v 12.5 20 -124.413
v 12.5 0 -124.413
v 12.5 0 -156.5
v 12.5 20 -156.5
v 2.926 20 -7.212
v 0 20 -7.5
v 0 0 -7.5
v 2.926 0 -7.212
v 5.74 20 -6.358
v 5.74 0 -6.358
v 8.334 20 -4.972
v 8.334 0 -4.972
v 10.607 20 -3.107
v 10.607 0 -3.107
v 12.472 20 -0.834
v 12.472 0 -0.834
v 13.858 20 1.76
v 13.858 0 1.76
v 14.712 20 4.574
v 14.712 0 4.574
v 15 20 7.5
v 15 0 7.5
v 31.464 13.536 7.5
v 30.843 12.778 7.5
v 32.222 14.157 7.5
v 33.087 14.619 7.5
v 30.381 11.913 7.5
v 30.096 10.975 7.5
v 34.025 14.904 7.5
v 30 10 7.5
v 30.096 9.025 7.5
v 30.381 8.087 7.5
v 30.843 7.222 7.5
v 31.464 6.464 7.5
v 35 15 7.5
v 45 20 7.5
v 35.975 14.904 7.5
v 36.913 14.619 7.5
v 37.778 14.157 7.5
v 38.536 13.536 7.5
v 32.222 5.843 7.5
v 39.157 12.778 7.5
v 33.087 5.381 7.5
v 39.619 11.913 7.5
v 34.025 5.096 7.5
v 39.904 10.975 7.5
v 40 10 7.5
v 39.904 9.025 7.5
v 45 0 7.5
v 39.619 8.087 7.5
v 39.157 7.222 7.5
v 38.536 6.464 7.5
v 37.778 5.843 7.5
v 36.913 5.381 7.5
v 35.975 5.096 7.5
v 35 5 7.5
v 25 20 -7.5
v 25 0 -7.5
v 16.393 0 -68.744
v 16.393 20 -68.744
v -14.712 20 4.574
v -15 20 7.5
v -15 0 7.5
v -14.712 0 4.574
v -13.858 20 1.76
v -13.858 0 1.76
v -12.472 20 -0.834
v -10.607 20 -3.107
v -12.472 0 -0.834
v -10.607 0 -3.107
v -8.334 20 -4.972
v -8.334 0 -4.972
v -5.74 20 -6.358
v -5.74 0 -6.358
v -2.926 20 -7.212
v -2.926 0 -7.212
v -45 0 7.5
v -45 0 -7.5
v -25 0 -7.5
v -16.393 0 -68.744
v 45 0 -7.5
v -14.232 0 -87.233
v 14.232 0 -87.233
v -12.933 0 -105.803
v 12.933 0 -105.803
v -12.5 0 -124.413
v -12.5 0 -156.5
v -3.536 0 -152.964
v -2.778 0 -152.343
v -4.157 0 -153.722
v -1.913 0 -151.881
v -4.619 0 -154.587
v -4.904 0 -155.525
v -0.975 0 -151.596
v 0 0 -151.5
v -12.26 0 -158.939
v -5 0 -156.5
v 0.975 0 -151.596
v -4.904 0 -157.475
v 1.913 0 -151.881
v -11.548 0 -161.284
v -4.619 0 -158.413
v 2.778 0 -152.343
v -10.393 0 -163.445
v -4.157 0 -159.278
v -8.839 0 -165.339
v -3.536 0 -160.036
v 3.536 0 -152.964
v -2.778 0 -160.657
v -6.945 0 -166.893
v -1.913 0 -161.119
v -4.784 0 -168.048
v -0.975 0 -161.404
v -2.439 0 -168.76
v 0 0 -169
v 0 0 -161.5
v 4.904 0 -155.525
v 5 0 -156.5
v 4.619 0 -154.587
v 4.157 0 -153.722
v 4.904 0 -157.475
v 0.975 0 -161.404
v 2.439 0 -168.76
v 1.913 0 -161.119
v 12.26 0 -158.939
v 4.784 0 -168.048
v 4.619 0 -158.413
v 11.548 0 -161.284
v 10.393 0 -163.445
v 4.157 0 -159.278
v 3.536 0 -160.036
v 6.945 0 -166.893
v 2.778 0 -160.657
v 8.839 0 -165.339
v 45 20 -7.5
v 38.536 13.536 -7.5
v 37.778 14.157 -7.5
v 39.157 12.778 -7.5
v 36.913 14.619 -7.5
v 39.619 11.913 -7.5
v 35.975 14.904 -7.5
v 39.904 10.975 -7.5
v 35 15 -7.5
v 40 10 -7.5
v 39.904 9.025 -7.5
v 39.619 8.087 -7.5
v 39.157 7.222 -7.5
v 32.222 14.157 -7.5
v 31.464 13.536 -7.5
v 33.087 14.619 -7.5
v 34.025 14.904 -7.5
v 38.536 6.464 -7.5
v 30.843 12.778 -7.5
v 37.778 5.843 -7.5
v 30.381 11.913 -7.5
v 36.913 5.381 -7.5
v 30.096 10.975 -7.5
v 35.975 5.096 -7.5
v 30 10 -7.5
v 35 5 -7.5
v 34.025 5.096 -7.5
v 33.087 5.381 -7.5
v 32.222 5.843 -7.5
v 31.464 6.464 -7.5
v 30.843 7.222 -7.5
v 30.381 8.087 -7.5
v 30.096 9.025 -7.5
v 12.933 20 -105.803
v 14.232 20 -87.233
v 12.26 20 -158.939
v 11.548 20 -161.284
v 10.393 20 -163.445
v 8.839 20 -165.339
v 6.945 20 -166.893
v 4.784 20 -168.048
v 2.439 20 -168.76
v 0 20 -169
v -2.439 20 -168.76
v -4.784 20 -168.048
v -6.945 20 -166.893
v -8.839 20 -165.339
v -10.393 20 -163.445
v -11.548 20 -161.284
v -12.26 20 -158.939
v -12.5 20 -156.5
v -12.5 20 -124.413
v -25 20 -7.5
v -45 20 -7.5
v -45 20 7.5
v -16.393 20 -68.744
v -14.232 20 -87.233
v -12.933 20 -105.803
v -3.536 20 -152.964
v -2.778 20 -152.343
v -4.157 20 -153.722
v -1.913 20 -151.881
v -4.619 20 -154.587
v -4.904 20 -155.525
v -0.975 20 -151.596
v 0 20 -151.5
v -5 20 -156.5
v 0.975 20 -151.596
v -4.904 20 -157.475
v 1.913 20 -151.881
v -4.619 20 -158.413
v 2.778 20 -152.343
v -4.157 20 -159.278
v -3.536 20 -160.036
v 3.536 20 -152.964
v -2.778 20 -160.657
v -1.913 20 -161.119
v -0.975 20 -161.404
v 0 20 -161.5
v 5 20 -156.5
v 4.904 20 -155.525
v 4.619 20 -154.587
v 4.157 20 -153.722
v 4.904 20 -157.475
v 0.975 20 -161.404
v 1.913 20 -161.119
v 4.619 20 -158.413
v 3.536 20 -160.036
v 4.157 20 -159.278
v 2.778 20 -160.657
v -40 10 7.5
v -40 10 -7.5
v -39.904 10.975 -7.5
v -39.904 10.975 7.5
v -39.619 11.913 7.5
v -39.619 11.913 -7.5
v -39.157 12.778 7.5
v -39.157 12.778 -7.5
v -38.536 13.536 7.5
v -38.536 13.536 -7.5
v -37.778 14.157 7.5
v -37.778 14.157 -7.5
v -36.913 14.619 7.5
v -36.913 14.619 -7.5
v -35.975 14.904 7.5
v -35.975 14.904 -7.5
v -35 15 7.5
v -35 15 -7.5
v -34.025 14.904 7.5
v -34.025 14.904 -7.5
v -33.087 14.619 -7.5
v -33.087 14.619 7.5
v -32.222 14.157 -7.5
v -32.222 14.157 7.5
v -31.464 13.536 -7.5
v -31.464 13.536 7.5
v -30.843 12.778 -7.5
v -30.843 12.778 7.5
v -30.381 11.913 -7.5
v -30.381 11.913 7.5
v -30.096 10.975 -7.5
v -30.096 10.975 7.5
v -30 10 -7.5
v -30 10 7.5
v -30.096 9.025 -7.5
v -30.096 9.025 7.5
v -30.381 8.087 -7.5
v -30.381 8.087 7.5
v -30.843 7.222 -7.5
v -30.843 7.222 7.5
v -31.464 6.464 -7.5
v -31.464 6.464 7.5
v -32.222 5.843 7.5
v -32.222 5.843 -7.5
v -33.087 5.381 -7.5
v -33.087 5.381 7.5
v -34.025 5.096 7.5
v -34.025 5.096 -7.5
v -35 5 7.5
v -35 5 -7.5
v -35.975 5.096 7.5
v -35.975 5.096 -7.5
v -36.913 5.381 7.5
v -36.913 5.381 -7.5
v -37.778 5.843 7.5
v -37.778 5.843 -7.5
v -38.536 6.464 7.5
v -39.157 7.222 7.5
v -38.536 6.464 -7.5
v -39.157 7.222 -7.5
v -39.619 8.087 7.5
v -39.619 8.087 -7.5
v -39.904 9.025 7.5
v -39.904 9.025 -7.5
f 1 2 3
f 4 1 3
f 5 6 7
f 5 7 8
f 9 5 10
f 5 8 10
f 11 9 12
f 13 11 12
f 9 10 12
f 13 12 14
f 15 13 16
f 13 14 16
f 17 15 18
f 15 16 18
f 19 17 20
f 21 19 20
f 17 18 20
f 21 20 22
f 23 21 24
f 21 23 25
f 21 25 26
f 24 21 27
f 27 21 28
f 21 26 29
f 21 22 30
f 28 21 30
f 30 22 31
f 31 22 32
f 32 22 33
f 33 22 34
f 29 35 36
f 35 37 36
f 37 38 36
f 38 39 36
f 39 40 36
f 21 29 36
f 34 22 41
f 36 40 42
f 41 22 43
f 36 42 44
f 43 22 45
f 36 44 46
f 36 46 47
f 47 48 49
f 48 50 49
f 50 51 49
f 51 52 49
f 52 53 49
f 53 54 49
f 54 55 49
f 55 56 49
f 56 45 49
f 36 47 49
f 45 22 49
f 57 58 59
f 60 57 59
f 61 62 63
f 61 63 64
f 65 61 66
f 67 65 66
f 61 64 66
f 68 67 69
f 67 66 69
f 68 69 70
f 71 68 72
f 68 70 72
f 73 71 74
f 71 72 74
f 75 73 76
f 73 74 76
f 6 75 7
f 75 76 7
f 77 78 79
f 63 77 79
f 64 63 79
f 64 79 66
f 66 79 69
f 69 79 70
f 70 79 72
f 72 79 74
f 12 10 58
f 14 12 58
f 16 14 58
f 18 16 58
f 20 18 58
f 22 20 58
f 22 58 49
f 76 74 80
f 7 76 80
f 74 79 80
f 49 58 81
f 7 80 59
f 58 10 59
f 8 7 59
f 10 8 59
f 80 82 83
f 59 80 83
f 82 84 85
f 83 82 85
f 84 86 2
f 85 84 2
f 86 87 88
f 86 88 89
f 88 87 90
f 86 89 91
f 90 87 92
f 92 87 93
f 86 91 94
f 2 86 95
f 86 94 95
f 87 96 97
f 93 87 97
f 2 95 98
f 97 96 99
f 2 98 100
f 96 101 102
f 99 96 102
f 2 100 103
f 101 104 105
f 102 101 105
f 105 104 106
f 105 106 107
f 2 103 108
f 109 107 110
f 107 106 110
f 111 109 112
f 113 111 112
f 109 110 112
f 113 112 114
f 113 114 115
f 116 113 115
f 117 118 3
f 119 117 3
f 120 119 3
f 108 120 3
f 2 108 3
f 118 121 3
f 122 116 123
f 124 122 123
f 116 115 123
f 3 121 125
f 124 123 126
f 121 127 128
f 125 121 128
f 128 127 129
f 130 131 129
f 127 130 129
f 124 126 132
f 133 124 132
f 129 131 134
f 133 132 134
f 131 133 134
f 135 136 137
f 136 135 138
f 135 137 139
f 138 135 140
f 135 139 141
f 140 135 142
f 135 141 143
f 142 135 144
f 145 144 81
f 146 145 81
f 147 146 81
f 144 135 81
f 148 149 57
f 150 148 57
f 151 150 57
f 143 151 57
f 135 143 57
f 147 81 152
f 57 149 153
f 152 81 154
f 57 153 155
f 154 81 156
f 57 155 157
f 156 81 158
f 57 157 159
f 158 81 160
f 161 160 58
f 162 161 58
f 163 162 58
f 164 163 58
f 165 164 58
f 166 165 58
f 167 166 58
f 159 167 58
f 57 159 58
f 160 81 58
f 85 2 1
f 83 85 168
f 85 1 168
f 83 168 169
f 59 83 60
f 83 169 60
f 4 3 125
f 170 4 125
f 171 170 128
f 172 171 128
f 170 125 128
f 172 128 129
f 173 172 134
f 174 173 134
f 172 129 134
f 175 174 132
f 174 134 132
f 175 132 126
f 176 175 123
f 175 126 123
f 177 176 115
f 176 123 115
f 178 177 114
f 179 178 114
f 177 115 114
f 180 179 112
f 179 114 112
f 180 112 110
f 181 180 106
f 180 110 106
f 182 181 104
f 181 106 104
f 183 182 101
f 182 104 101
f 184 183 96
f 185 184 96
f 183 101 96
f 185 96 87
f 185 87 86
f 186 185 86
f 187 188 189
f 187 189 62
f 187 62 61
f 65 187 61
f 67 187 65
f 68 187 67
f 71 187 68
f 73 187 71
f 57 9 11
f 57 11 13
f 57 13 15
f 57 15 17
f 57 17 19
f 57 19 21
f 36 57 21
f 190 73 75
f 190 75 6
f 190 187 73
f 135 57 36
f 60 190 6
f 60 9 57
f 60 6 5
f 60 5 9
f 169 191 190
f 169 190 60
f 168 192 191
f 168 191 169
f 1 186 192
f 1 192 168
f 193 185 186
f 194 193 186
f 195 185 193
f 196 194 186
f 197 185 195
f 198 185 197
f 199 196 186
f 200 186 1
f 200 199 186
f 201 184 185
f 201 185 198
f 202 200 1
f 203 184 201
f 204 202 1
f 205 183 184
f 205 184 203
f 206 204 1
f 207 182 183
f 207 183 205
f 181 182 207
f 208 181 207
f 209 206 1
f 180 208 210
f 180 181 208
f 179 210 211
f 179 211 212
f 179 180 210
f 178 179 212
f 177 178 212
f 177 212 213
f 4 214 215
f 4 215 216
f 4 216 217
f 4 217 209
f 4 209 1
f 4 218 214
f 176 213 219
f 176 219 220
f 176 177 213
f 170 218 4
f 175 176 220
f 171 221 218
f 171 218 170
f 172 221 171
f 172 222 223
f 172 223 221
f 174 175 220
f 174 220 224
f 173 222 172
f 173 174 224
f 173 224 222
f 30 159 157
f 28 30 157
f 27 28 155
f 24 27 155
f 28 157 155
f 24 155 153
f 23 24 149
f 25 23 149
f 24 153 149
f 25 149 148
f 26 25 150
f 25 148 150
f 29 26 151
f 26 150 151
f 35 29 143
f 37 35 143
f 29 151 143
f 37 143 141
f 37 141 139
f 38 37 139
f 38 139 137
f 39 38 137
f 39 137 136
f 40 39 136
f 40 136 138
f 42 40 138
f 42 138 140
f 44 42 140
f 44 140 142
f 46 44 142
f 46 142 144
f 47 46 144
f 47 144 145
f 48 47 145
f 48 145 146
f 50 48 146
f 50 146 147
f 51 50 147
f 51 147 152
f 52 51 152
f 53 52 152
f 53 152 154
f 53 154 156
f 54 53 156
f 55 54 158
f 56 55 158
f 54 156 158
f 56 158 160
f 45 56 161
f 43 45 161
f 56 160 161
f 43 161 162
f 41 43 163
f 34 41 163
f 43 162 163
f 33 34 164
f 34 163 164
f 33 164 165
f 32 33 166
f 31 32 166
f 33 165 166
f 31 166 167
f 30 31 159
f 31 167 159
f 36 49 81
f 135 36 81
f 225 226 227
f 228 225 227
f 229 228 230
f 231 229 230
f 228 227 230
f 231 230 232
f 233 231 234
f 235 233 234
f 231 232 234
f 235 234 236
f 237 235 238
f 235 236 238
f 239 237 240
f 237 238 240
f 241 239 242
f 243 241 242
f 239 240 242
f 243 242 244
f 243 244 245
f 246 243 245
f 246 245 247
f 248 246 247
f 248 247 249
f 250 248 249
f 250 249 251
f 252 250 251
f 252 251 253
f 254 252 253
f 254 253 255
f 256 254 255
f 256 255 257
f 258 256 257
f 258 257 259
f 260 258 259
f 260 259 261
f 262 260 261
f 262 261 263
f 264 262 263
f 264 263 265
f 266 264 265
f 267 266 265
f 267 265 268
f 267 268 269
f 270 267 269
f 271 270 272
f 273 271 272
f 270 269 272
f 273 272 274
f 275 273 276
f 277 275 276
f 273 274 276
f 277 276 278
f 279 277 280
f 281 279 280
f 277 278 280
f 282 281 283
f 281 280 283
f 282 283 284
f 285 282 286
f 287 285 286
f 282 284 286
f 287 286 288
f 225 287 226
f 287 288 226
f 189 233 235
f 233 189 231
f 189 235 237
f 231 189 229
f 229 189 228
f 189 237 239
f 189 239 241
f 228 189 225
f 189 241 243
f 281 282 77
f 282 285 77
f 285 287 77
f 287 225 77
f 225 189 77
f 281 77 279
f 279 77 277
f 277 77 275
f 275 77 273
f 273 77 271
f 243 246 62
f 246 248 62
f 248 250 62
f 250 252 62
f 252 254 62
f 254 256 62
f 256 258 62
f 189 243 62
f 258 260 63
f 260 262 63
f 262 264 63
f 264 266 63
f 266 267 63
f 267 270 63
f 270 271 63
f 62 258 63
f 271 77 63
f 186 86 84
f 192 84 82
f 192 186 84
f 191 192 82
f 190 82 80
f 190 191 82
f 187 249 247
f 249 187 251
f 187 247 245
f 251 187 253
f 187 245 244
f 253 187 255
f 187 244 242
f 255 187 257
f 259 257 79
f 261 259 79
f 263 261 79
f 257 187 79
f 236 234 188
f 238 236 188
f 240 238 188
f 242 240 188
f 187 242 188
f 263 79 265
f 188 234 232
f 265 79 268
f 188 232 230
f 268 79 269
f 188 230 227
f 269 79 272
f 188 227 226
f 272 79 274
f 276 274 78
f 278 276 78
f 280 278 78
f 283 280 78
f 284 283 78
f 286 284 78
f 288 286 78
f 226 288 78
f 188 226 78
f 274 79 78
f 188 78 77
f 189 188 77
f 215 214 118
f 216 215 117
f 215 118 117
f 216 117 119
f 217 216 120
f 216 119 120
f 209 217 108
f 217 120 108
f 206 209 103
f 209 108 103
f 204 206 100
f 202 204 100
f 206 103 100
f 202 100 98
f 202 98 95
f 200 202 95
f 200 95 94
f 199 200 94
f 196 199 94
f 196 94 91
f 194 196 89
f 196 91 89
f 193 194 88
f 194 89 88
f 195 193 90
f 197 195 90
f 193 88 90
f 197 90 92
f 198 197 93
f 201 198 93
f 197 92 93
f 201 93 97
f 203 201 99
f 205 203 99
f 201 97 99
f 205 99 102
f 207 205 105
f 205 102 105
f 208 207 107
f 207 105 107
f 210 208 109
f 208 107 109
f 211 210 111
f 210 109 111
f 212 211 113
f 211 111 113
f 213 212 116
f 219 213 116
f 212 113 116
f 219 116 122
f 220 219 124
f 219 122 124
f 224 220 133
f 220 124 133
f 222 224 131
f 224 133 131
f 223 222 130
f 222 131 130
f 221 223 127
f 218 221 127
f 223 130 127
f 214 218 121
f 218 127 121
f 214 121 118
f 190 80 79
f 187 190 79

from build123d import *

# Parameters (mm, degrees)
BOSS_EXTRUDE1_DEPTH = 20
SKETCH2_R           = 5
CUT_EXTRUDE1_DEPTH  = 16
FILLET1_R           = 400


with BuildPart() as part:
    # Sketch1 → Boss-Extrude1 (new body)
    with BuildSketch(Plane(origin=(0, 0, 0), x_dir=(1, 0, 0), z_dir=(0, 1, 0))):
        with BuildLine():
            ThreePointArc((12.5, 156.5), (0, 169), (-12.5, 156.5))
            Line((-12.5, 156.5), (-5, 156.5))
            ThreePointArc((-5, 156.5), (0, 161.5), (5, 156.5))
            Line((5, 156.5), (12.5, 156.5))
        make_face()
        with BuildLine():
            Line((-5, 156.5), (-12.5, 156.5))
            ThreePointArc((-12.5, 156.5), (0, 144), (12.5, 156.5))
            Line((12.5, 156.5), (5, 156.5))
            ThreePointArc((5, 156.5), (0, 151.5), (-5, 156.5))
        make_face()
        with BuildLine():
            Line((-12.5, 156.5), (-12.5, 96.44212153))
            Line((-12.5, 96.44212153), (12.5, 96.44212153))
            Line((12.5, 96.44212153), (12.5, 156.5))
            ThreePointArc((12.5, 156.5), (0, 144), (-12.5, 156.5))
        make_face()
        Polygon((-12.5, 96.44212153), (-25, 7.5), (-2.3e-08, 7.5), (25, 7.5), (12.5, 96.44212153), align=None)
        with BuildLine():
            Line((-2.3e-08, 7.5), (-25, 7.5))
            Line((-25, 7.5), (-45, 7.5))
            Line((-45, 7.5), (-45, -7.5))
            Line((-45, -7.5), (-15, -7.5))
            ThreePointArc((-15, -7.5), (-10.606601726, 3.10660171), (-2.3e-08, 7.5))
        make_face()
        with BuildLine():
            Line((25, 7.5), (-2.3e-08, 7.5))
            ThreePointArc((-2.3e-08, 7.5), (10.60660171, 3.106601726), (15, -7.5))
            Line((15, -7.5), (45, -7.5))
            Line((45, -7.5), (45, 7.5))
            Line((45, 7.5), (25, 7.5))
        make_face()
    extrude(amount=BOSS_EXTRUDE1_DEPTH)

    # Sketch2 → Cut-Extrude1 (cut, through all)
    with BuildSketch(Plane(origin=(0, 0, -7.5), x_dir=(-1, 0, 0), z_dir=(0, 0, -1))):
        with Locations((35, 10)):
            Circle(SKETCH2_R)
        with Locations((-35, 10)):
            Circle(SKETCH2_R)
    extrude(amount=-CUT_EXTRUDE1_DEPTH, mode=Mode.SUBTRACT)

    # Fillet1
    fillet1_edges = [part.edges().sort_by_distance(p)[0] for p in [
        (12.5, 10, -96.44212153),
        (-12.5, 10, -96.44212153),
    ]]
    fillet(fillet1_edges, radius=FILLET1_R)


solid = part.part
